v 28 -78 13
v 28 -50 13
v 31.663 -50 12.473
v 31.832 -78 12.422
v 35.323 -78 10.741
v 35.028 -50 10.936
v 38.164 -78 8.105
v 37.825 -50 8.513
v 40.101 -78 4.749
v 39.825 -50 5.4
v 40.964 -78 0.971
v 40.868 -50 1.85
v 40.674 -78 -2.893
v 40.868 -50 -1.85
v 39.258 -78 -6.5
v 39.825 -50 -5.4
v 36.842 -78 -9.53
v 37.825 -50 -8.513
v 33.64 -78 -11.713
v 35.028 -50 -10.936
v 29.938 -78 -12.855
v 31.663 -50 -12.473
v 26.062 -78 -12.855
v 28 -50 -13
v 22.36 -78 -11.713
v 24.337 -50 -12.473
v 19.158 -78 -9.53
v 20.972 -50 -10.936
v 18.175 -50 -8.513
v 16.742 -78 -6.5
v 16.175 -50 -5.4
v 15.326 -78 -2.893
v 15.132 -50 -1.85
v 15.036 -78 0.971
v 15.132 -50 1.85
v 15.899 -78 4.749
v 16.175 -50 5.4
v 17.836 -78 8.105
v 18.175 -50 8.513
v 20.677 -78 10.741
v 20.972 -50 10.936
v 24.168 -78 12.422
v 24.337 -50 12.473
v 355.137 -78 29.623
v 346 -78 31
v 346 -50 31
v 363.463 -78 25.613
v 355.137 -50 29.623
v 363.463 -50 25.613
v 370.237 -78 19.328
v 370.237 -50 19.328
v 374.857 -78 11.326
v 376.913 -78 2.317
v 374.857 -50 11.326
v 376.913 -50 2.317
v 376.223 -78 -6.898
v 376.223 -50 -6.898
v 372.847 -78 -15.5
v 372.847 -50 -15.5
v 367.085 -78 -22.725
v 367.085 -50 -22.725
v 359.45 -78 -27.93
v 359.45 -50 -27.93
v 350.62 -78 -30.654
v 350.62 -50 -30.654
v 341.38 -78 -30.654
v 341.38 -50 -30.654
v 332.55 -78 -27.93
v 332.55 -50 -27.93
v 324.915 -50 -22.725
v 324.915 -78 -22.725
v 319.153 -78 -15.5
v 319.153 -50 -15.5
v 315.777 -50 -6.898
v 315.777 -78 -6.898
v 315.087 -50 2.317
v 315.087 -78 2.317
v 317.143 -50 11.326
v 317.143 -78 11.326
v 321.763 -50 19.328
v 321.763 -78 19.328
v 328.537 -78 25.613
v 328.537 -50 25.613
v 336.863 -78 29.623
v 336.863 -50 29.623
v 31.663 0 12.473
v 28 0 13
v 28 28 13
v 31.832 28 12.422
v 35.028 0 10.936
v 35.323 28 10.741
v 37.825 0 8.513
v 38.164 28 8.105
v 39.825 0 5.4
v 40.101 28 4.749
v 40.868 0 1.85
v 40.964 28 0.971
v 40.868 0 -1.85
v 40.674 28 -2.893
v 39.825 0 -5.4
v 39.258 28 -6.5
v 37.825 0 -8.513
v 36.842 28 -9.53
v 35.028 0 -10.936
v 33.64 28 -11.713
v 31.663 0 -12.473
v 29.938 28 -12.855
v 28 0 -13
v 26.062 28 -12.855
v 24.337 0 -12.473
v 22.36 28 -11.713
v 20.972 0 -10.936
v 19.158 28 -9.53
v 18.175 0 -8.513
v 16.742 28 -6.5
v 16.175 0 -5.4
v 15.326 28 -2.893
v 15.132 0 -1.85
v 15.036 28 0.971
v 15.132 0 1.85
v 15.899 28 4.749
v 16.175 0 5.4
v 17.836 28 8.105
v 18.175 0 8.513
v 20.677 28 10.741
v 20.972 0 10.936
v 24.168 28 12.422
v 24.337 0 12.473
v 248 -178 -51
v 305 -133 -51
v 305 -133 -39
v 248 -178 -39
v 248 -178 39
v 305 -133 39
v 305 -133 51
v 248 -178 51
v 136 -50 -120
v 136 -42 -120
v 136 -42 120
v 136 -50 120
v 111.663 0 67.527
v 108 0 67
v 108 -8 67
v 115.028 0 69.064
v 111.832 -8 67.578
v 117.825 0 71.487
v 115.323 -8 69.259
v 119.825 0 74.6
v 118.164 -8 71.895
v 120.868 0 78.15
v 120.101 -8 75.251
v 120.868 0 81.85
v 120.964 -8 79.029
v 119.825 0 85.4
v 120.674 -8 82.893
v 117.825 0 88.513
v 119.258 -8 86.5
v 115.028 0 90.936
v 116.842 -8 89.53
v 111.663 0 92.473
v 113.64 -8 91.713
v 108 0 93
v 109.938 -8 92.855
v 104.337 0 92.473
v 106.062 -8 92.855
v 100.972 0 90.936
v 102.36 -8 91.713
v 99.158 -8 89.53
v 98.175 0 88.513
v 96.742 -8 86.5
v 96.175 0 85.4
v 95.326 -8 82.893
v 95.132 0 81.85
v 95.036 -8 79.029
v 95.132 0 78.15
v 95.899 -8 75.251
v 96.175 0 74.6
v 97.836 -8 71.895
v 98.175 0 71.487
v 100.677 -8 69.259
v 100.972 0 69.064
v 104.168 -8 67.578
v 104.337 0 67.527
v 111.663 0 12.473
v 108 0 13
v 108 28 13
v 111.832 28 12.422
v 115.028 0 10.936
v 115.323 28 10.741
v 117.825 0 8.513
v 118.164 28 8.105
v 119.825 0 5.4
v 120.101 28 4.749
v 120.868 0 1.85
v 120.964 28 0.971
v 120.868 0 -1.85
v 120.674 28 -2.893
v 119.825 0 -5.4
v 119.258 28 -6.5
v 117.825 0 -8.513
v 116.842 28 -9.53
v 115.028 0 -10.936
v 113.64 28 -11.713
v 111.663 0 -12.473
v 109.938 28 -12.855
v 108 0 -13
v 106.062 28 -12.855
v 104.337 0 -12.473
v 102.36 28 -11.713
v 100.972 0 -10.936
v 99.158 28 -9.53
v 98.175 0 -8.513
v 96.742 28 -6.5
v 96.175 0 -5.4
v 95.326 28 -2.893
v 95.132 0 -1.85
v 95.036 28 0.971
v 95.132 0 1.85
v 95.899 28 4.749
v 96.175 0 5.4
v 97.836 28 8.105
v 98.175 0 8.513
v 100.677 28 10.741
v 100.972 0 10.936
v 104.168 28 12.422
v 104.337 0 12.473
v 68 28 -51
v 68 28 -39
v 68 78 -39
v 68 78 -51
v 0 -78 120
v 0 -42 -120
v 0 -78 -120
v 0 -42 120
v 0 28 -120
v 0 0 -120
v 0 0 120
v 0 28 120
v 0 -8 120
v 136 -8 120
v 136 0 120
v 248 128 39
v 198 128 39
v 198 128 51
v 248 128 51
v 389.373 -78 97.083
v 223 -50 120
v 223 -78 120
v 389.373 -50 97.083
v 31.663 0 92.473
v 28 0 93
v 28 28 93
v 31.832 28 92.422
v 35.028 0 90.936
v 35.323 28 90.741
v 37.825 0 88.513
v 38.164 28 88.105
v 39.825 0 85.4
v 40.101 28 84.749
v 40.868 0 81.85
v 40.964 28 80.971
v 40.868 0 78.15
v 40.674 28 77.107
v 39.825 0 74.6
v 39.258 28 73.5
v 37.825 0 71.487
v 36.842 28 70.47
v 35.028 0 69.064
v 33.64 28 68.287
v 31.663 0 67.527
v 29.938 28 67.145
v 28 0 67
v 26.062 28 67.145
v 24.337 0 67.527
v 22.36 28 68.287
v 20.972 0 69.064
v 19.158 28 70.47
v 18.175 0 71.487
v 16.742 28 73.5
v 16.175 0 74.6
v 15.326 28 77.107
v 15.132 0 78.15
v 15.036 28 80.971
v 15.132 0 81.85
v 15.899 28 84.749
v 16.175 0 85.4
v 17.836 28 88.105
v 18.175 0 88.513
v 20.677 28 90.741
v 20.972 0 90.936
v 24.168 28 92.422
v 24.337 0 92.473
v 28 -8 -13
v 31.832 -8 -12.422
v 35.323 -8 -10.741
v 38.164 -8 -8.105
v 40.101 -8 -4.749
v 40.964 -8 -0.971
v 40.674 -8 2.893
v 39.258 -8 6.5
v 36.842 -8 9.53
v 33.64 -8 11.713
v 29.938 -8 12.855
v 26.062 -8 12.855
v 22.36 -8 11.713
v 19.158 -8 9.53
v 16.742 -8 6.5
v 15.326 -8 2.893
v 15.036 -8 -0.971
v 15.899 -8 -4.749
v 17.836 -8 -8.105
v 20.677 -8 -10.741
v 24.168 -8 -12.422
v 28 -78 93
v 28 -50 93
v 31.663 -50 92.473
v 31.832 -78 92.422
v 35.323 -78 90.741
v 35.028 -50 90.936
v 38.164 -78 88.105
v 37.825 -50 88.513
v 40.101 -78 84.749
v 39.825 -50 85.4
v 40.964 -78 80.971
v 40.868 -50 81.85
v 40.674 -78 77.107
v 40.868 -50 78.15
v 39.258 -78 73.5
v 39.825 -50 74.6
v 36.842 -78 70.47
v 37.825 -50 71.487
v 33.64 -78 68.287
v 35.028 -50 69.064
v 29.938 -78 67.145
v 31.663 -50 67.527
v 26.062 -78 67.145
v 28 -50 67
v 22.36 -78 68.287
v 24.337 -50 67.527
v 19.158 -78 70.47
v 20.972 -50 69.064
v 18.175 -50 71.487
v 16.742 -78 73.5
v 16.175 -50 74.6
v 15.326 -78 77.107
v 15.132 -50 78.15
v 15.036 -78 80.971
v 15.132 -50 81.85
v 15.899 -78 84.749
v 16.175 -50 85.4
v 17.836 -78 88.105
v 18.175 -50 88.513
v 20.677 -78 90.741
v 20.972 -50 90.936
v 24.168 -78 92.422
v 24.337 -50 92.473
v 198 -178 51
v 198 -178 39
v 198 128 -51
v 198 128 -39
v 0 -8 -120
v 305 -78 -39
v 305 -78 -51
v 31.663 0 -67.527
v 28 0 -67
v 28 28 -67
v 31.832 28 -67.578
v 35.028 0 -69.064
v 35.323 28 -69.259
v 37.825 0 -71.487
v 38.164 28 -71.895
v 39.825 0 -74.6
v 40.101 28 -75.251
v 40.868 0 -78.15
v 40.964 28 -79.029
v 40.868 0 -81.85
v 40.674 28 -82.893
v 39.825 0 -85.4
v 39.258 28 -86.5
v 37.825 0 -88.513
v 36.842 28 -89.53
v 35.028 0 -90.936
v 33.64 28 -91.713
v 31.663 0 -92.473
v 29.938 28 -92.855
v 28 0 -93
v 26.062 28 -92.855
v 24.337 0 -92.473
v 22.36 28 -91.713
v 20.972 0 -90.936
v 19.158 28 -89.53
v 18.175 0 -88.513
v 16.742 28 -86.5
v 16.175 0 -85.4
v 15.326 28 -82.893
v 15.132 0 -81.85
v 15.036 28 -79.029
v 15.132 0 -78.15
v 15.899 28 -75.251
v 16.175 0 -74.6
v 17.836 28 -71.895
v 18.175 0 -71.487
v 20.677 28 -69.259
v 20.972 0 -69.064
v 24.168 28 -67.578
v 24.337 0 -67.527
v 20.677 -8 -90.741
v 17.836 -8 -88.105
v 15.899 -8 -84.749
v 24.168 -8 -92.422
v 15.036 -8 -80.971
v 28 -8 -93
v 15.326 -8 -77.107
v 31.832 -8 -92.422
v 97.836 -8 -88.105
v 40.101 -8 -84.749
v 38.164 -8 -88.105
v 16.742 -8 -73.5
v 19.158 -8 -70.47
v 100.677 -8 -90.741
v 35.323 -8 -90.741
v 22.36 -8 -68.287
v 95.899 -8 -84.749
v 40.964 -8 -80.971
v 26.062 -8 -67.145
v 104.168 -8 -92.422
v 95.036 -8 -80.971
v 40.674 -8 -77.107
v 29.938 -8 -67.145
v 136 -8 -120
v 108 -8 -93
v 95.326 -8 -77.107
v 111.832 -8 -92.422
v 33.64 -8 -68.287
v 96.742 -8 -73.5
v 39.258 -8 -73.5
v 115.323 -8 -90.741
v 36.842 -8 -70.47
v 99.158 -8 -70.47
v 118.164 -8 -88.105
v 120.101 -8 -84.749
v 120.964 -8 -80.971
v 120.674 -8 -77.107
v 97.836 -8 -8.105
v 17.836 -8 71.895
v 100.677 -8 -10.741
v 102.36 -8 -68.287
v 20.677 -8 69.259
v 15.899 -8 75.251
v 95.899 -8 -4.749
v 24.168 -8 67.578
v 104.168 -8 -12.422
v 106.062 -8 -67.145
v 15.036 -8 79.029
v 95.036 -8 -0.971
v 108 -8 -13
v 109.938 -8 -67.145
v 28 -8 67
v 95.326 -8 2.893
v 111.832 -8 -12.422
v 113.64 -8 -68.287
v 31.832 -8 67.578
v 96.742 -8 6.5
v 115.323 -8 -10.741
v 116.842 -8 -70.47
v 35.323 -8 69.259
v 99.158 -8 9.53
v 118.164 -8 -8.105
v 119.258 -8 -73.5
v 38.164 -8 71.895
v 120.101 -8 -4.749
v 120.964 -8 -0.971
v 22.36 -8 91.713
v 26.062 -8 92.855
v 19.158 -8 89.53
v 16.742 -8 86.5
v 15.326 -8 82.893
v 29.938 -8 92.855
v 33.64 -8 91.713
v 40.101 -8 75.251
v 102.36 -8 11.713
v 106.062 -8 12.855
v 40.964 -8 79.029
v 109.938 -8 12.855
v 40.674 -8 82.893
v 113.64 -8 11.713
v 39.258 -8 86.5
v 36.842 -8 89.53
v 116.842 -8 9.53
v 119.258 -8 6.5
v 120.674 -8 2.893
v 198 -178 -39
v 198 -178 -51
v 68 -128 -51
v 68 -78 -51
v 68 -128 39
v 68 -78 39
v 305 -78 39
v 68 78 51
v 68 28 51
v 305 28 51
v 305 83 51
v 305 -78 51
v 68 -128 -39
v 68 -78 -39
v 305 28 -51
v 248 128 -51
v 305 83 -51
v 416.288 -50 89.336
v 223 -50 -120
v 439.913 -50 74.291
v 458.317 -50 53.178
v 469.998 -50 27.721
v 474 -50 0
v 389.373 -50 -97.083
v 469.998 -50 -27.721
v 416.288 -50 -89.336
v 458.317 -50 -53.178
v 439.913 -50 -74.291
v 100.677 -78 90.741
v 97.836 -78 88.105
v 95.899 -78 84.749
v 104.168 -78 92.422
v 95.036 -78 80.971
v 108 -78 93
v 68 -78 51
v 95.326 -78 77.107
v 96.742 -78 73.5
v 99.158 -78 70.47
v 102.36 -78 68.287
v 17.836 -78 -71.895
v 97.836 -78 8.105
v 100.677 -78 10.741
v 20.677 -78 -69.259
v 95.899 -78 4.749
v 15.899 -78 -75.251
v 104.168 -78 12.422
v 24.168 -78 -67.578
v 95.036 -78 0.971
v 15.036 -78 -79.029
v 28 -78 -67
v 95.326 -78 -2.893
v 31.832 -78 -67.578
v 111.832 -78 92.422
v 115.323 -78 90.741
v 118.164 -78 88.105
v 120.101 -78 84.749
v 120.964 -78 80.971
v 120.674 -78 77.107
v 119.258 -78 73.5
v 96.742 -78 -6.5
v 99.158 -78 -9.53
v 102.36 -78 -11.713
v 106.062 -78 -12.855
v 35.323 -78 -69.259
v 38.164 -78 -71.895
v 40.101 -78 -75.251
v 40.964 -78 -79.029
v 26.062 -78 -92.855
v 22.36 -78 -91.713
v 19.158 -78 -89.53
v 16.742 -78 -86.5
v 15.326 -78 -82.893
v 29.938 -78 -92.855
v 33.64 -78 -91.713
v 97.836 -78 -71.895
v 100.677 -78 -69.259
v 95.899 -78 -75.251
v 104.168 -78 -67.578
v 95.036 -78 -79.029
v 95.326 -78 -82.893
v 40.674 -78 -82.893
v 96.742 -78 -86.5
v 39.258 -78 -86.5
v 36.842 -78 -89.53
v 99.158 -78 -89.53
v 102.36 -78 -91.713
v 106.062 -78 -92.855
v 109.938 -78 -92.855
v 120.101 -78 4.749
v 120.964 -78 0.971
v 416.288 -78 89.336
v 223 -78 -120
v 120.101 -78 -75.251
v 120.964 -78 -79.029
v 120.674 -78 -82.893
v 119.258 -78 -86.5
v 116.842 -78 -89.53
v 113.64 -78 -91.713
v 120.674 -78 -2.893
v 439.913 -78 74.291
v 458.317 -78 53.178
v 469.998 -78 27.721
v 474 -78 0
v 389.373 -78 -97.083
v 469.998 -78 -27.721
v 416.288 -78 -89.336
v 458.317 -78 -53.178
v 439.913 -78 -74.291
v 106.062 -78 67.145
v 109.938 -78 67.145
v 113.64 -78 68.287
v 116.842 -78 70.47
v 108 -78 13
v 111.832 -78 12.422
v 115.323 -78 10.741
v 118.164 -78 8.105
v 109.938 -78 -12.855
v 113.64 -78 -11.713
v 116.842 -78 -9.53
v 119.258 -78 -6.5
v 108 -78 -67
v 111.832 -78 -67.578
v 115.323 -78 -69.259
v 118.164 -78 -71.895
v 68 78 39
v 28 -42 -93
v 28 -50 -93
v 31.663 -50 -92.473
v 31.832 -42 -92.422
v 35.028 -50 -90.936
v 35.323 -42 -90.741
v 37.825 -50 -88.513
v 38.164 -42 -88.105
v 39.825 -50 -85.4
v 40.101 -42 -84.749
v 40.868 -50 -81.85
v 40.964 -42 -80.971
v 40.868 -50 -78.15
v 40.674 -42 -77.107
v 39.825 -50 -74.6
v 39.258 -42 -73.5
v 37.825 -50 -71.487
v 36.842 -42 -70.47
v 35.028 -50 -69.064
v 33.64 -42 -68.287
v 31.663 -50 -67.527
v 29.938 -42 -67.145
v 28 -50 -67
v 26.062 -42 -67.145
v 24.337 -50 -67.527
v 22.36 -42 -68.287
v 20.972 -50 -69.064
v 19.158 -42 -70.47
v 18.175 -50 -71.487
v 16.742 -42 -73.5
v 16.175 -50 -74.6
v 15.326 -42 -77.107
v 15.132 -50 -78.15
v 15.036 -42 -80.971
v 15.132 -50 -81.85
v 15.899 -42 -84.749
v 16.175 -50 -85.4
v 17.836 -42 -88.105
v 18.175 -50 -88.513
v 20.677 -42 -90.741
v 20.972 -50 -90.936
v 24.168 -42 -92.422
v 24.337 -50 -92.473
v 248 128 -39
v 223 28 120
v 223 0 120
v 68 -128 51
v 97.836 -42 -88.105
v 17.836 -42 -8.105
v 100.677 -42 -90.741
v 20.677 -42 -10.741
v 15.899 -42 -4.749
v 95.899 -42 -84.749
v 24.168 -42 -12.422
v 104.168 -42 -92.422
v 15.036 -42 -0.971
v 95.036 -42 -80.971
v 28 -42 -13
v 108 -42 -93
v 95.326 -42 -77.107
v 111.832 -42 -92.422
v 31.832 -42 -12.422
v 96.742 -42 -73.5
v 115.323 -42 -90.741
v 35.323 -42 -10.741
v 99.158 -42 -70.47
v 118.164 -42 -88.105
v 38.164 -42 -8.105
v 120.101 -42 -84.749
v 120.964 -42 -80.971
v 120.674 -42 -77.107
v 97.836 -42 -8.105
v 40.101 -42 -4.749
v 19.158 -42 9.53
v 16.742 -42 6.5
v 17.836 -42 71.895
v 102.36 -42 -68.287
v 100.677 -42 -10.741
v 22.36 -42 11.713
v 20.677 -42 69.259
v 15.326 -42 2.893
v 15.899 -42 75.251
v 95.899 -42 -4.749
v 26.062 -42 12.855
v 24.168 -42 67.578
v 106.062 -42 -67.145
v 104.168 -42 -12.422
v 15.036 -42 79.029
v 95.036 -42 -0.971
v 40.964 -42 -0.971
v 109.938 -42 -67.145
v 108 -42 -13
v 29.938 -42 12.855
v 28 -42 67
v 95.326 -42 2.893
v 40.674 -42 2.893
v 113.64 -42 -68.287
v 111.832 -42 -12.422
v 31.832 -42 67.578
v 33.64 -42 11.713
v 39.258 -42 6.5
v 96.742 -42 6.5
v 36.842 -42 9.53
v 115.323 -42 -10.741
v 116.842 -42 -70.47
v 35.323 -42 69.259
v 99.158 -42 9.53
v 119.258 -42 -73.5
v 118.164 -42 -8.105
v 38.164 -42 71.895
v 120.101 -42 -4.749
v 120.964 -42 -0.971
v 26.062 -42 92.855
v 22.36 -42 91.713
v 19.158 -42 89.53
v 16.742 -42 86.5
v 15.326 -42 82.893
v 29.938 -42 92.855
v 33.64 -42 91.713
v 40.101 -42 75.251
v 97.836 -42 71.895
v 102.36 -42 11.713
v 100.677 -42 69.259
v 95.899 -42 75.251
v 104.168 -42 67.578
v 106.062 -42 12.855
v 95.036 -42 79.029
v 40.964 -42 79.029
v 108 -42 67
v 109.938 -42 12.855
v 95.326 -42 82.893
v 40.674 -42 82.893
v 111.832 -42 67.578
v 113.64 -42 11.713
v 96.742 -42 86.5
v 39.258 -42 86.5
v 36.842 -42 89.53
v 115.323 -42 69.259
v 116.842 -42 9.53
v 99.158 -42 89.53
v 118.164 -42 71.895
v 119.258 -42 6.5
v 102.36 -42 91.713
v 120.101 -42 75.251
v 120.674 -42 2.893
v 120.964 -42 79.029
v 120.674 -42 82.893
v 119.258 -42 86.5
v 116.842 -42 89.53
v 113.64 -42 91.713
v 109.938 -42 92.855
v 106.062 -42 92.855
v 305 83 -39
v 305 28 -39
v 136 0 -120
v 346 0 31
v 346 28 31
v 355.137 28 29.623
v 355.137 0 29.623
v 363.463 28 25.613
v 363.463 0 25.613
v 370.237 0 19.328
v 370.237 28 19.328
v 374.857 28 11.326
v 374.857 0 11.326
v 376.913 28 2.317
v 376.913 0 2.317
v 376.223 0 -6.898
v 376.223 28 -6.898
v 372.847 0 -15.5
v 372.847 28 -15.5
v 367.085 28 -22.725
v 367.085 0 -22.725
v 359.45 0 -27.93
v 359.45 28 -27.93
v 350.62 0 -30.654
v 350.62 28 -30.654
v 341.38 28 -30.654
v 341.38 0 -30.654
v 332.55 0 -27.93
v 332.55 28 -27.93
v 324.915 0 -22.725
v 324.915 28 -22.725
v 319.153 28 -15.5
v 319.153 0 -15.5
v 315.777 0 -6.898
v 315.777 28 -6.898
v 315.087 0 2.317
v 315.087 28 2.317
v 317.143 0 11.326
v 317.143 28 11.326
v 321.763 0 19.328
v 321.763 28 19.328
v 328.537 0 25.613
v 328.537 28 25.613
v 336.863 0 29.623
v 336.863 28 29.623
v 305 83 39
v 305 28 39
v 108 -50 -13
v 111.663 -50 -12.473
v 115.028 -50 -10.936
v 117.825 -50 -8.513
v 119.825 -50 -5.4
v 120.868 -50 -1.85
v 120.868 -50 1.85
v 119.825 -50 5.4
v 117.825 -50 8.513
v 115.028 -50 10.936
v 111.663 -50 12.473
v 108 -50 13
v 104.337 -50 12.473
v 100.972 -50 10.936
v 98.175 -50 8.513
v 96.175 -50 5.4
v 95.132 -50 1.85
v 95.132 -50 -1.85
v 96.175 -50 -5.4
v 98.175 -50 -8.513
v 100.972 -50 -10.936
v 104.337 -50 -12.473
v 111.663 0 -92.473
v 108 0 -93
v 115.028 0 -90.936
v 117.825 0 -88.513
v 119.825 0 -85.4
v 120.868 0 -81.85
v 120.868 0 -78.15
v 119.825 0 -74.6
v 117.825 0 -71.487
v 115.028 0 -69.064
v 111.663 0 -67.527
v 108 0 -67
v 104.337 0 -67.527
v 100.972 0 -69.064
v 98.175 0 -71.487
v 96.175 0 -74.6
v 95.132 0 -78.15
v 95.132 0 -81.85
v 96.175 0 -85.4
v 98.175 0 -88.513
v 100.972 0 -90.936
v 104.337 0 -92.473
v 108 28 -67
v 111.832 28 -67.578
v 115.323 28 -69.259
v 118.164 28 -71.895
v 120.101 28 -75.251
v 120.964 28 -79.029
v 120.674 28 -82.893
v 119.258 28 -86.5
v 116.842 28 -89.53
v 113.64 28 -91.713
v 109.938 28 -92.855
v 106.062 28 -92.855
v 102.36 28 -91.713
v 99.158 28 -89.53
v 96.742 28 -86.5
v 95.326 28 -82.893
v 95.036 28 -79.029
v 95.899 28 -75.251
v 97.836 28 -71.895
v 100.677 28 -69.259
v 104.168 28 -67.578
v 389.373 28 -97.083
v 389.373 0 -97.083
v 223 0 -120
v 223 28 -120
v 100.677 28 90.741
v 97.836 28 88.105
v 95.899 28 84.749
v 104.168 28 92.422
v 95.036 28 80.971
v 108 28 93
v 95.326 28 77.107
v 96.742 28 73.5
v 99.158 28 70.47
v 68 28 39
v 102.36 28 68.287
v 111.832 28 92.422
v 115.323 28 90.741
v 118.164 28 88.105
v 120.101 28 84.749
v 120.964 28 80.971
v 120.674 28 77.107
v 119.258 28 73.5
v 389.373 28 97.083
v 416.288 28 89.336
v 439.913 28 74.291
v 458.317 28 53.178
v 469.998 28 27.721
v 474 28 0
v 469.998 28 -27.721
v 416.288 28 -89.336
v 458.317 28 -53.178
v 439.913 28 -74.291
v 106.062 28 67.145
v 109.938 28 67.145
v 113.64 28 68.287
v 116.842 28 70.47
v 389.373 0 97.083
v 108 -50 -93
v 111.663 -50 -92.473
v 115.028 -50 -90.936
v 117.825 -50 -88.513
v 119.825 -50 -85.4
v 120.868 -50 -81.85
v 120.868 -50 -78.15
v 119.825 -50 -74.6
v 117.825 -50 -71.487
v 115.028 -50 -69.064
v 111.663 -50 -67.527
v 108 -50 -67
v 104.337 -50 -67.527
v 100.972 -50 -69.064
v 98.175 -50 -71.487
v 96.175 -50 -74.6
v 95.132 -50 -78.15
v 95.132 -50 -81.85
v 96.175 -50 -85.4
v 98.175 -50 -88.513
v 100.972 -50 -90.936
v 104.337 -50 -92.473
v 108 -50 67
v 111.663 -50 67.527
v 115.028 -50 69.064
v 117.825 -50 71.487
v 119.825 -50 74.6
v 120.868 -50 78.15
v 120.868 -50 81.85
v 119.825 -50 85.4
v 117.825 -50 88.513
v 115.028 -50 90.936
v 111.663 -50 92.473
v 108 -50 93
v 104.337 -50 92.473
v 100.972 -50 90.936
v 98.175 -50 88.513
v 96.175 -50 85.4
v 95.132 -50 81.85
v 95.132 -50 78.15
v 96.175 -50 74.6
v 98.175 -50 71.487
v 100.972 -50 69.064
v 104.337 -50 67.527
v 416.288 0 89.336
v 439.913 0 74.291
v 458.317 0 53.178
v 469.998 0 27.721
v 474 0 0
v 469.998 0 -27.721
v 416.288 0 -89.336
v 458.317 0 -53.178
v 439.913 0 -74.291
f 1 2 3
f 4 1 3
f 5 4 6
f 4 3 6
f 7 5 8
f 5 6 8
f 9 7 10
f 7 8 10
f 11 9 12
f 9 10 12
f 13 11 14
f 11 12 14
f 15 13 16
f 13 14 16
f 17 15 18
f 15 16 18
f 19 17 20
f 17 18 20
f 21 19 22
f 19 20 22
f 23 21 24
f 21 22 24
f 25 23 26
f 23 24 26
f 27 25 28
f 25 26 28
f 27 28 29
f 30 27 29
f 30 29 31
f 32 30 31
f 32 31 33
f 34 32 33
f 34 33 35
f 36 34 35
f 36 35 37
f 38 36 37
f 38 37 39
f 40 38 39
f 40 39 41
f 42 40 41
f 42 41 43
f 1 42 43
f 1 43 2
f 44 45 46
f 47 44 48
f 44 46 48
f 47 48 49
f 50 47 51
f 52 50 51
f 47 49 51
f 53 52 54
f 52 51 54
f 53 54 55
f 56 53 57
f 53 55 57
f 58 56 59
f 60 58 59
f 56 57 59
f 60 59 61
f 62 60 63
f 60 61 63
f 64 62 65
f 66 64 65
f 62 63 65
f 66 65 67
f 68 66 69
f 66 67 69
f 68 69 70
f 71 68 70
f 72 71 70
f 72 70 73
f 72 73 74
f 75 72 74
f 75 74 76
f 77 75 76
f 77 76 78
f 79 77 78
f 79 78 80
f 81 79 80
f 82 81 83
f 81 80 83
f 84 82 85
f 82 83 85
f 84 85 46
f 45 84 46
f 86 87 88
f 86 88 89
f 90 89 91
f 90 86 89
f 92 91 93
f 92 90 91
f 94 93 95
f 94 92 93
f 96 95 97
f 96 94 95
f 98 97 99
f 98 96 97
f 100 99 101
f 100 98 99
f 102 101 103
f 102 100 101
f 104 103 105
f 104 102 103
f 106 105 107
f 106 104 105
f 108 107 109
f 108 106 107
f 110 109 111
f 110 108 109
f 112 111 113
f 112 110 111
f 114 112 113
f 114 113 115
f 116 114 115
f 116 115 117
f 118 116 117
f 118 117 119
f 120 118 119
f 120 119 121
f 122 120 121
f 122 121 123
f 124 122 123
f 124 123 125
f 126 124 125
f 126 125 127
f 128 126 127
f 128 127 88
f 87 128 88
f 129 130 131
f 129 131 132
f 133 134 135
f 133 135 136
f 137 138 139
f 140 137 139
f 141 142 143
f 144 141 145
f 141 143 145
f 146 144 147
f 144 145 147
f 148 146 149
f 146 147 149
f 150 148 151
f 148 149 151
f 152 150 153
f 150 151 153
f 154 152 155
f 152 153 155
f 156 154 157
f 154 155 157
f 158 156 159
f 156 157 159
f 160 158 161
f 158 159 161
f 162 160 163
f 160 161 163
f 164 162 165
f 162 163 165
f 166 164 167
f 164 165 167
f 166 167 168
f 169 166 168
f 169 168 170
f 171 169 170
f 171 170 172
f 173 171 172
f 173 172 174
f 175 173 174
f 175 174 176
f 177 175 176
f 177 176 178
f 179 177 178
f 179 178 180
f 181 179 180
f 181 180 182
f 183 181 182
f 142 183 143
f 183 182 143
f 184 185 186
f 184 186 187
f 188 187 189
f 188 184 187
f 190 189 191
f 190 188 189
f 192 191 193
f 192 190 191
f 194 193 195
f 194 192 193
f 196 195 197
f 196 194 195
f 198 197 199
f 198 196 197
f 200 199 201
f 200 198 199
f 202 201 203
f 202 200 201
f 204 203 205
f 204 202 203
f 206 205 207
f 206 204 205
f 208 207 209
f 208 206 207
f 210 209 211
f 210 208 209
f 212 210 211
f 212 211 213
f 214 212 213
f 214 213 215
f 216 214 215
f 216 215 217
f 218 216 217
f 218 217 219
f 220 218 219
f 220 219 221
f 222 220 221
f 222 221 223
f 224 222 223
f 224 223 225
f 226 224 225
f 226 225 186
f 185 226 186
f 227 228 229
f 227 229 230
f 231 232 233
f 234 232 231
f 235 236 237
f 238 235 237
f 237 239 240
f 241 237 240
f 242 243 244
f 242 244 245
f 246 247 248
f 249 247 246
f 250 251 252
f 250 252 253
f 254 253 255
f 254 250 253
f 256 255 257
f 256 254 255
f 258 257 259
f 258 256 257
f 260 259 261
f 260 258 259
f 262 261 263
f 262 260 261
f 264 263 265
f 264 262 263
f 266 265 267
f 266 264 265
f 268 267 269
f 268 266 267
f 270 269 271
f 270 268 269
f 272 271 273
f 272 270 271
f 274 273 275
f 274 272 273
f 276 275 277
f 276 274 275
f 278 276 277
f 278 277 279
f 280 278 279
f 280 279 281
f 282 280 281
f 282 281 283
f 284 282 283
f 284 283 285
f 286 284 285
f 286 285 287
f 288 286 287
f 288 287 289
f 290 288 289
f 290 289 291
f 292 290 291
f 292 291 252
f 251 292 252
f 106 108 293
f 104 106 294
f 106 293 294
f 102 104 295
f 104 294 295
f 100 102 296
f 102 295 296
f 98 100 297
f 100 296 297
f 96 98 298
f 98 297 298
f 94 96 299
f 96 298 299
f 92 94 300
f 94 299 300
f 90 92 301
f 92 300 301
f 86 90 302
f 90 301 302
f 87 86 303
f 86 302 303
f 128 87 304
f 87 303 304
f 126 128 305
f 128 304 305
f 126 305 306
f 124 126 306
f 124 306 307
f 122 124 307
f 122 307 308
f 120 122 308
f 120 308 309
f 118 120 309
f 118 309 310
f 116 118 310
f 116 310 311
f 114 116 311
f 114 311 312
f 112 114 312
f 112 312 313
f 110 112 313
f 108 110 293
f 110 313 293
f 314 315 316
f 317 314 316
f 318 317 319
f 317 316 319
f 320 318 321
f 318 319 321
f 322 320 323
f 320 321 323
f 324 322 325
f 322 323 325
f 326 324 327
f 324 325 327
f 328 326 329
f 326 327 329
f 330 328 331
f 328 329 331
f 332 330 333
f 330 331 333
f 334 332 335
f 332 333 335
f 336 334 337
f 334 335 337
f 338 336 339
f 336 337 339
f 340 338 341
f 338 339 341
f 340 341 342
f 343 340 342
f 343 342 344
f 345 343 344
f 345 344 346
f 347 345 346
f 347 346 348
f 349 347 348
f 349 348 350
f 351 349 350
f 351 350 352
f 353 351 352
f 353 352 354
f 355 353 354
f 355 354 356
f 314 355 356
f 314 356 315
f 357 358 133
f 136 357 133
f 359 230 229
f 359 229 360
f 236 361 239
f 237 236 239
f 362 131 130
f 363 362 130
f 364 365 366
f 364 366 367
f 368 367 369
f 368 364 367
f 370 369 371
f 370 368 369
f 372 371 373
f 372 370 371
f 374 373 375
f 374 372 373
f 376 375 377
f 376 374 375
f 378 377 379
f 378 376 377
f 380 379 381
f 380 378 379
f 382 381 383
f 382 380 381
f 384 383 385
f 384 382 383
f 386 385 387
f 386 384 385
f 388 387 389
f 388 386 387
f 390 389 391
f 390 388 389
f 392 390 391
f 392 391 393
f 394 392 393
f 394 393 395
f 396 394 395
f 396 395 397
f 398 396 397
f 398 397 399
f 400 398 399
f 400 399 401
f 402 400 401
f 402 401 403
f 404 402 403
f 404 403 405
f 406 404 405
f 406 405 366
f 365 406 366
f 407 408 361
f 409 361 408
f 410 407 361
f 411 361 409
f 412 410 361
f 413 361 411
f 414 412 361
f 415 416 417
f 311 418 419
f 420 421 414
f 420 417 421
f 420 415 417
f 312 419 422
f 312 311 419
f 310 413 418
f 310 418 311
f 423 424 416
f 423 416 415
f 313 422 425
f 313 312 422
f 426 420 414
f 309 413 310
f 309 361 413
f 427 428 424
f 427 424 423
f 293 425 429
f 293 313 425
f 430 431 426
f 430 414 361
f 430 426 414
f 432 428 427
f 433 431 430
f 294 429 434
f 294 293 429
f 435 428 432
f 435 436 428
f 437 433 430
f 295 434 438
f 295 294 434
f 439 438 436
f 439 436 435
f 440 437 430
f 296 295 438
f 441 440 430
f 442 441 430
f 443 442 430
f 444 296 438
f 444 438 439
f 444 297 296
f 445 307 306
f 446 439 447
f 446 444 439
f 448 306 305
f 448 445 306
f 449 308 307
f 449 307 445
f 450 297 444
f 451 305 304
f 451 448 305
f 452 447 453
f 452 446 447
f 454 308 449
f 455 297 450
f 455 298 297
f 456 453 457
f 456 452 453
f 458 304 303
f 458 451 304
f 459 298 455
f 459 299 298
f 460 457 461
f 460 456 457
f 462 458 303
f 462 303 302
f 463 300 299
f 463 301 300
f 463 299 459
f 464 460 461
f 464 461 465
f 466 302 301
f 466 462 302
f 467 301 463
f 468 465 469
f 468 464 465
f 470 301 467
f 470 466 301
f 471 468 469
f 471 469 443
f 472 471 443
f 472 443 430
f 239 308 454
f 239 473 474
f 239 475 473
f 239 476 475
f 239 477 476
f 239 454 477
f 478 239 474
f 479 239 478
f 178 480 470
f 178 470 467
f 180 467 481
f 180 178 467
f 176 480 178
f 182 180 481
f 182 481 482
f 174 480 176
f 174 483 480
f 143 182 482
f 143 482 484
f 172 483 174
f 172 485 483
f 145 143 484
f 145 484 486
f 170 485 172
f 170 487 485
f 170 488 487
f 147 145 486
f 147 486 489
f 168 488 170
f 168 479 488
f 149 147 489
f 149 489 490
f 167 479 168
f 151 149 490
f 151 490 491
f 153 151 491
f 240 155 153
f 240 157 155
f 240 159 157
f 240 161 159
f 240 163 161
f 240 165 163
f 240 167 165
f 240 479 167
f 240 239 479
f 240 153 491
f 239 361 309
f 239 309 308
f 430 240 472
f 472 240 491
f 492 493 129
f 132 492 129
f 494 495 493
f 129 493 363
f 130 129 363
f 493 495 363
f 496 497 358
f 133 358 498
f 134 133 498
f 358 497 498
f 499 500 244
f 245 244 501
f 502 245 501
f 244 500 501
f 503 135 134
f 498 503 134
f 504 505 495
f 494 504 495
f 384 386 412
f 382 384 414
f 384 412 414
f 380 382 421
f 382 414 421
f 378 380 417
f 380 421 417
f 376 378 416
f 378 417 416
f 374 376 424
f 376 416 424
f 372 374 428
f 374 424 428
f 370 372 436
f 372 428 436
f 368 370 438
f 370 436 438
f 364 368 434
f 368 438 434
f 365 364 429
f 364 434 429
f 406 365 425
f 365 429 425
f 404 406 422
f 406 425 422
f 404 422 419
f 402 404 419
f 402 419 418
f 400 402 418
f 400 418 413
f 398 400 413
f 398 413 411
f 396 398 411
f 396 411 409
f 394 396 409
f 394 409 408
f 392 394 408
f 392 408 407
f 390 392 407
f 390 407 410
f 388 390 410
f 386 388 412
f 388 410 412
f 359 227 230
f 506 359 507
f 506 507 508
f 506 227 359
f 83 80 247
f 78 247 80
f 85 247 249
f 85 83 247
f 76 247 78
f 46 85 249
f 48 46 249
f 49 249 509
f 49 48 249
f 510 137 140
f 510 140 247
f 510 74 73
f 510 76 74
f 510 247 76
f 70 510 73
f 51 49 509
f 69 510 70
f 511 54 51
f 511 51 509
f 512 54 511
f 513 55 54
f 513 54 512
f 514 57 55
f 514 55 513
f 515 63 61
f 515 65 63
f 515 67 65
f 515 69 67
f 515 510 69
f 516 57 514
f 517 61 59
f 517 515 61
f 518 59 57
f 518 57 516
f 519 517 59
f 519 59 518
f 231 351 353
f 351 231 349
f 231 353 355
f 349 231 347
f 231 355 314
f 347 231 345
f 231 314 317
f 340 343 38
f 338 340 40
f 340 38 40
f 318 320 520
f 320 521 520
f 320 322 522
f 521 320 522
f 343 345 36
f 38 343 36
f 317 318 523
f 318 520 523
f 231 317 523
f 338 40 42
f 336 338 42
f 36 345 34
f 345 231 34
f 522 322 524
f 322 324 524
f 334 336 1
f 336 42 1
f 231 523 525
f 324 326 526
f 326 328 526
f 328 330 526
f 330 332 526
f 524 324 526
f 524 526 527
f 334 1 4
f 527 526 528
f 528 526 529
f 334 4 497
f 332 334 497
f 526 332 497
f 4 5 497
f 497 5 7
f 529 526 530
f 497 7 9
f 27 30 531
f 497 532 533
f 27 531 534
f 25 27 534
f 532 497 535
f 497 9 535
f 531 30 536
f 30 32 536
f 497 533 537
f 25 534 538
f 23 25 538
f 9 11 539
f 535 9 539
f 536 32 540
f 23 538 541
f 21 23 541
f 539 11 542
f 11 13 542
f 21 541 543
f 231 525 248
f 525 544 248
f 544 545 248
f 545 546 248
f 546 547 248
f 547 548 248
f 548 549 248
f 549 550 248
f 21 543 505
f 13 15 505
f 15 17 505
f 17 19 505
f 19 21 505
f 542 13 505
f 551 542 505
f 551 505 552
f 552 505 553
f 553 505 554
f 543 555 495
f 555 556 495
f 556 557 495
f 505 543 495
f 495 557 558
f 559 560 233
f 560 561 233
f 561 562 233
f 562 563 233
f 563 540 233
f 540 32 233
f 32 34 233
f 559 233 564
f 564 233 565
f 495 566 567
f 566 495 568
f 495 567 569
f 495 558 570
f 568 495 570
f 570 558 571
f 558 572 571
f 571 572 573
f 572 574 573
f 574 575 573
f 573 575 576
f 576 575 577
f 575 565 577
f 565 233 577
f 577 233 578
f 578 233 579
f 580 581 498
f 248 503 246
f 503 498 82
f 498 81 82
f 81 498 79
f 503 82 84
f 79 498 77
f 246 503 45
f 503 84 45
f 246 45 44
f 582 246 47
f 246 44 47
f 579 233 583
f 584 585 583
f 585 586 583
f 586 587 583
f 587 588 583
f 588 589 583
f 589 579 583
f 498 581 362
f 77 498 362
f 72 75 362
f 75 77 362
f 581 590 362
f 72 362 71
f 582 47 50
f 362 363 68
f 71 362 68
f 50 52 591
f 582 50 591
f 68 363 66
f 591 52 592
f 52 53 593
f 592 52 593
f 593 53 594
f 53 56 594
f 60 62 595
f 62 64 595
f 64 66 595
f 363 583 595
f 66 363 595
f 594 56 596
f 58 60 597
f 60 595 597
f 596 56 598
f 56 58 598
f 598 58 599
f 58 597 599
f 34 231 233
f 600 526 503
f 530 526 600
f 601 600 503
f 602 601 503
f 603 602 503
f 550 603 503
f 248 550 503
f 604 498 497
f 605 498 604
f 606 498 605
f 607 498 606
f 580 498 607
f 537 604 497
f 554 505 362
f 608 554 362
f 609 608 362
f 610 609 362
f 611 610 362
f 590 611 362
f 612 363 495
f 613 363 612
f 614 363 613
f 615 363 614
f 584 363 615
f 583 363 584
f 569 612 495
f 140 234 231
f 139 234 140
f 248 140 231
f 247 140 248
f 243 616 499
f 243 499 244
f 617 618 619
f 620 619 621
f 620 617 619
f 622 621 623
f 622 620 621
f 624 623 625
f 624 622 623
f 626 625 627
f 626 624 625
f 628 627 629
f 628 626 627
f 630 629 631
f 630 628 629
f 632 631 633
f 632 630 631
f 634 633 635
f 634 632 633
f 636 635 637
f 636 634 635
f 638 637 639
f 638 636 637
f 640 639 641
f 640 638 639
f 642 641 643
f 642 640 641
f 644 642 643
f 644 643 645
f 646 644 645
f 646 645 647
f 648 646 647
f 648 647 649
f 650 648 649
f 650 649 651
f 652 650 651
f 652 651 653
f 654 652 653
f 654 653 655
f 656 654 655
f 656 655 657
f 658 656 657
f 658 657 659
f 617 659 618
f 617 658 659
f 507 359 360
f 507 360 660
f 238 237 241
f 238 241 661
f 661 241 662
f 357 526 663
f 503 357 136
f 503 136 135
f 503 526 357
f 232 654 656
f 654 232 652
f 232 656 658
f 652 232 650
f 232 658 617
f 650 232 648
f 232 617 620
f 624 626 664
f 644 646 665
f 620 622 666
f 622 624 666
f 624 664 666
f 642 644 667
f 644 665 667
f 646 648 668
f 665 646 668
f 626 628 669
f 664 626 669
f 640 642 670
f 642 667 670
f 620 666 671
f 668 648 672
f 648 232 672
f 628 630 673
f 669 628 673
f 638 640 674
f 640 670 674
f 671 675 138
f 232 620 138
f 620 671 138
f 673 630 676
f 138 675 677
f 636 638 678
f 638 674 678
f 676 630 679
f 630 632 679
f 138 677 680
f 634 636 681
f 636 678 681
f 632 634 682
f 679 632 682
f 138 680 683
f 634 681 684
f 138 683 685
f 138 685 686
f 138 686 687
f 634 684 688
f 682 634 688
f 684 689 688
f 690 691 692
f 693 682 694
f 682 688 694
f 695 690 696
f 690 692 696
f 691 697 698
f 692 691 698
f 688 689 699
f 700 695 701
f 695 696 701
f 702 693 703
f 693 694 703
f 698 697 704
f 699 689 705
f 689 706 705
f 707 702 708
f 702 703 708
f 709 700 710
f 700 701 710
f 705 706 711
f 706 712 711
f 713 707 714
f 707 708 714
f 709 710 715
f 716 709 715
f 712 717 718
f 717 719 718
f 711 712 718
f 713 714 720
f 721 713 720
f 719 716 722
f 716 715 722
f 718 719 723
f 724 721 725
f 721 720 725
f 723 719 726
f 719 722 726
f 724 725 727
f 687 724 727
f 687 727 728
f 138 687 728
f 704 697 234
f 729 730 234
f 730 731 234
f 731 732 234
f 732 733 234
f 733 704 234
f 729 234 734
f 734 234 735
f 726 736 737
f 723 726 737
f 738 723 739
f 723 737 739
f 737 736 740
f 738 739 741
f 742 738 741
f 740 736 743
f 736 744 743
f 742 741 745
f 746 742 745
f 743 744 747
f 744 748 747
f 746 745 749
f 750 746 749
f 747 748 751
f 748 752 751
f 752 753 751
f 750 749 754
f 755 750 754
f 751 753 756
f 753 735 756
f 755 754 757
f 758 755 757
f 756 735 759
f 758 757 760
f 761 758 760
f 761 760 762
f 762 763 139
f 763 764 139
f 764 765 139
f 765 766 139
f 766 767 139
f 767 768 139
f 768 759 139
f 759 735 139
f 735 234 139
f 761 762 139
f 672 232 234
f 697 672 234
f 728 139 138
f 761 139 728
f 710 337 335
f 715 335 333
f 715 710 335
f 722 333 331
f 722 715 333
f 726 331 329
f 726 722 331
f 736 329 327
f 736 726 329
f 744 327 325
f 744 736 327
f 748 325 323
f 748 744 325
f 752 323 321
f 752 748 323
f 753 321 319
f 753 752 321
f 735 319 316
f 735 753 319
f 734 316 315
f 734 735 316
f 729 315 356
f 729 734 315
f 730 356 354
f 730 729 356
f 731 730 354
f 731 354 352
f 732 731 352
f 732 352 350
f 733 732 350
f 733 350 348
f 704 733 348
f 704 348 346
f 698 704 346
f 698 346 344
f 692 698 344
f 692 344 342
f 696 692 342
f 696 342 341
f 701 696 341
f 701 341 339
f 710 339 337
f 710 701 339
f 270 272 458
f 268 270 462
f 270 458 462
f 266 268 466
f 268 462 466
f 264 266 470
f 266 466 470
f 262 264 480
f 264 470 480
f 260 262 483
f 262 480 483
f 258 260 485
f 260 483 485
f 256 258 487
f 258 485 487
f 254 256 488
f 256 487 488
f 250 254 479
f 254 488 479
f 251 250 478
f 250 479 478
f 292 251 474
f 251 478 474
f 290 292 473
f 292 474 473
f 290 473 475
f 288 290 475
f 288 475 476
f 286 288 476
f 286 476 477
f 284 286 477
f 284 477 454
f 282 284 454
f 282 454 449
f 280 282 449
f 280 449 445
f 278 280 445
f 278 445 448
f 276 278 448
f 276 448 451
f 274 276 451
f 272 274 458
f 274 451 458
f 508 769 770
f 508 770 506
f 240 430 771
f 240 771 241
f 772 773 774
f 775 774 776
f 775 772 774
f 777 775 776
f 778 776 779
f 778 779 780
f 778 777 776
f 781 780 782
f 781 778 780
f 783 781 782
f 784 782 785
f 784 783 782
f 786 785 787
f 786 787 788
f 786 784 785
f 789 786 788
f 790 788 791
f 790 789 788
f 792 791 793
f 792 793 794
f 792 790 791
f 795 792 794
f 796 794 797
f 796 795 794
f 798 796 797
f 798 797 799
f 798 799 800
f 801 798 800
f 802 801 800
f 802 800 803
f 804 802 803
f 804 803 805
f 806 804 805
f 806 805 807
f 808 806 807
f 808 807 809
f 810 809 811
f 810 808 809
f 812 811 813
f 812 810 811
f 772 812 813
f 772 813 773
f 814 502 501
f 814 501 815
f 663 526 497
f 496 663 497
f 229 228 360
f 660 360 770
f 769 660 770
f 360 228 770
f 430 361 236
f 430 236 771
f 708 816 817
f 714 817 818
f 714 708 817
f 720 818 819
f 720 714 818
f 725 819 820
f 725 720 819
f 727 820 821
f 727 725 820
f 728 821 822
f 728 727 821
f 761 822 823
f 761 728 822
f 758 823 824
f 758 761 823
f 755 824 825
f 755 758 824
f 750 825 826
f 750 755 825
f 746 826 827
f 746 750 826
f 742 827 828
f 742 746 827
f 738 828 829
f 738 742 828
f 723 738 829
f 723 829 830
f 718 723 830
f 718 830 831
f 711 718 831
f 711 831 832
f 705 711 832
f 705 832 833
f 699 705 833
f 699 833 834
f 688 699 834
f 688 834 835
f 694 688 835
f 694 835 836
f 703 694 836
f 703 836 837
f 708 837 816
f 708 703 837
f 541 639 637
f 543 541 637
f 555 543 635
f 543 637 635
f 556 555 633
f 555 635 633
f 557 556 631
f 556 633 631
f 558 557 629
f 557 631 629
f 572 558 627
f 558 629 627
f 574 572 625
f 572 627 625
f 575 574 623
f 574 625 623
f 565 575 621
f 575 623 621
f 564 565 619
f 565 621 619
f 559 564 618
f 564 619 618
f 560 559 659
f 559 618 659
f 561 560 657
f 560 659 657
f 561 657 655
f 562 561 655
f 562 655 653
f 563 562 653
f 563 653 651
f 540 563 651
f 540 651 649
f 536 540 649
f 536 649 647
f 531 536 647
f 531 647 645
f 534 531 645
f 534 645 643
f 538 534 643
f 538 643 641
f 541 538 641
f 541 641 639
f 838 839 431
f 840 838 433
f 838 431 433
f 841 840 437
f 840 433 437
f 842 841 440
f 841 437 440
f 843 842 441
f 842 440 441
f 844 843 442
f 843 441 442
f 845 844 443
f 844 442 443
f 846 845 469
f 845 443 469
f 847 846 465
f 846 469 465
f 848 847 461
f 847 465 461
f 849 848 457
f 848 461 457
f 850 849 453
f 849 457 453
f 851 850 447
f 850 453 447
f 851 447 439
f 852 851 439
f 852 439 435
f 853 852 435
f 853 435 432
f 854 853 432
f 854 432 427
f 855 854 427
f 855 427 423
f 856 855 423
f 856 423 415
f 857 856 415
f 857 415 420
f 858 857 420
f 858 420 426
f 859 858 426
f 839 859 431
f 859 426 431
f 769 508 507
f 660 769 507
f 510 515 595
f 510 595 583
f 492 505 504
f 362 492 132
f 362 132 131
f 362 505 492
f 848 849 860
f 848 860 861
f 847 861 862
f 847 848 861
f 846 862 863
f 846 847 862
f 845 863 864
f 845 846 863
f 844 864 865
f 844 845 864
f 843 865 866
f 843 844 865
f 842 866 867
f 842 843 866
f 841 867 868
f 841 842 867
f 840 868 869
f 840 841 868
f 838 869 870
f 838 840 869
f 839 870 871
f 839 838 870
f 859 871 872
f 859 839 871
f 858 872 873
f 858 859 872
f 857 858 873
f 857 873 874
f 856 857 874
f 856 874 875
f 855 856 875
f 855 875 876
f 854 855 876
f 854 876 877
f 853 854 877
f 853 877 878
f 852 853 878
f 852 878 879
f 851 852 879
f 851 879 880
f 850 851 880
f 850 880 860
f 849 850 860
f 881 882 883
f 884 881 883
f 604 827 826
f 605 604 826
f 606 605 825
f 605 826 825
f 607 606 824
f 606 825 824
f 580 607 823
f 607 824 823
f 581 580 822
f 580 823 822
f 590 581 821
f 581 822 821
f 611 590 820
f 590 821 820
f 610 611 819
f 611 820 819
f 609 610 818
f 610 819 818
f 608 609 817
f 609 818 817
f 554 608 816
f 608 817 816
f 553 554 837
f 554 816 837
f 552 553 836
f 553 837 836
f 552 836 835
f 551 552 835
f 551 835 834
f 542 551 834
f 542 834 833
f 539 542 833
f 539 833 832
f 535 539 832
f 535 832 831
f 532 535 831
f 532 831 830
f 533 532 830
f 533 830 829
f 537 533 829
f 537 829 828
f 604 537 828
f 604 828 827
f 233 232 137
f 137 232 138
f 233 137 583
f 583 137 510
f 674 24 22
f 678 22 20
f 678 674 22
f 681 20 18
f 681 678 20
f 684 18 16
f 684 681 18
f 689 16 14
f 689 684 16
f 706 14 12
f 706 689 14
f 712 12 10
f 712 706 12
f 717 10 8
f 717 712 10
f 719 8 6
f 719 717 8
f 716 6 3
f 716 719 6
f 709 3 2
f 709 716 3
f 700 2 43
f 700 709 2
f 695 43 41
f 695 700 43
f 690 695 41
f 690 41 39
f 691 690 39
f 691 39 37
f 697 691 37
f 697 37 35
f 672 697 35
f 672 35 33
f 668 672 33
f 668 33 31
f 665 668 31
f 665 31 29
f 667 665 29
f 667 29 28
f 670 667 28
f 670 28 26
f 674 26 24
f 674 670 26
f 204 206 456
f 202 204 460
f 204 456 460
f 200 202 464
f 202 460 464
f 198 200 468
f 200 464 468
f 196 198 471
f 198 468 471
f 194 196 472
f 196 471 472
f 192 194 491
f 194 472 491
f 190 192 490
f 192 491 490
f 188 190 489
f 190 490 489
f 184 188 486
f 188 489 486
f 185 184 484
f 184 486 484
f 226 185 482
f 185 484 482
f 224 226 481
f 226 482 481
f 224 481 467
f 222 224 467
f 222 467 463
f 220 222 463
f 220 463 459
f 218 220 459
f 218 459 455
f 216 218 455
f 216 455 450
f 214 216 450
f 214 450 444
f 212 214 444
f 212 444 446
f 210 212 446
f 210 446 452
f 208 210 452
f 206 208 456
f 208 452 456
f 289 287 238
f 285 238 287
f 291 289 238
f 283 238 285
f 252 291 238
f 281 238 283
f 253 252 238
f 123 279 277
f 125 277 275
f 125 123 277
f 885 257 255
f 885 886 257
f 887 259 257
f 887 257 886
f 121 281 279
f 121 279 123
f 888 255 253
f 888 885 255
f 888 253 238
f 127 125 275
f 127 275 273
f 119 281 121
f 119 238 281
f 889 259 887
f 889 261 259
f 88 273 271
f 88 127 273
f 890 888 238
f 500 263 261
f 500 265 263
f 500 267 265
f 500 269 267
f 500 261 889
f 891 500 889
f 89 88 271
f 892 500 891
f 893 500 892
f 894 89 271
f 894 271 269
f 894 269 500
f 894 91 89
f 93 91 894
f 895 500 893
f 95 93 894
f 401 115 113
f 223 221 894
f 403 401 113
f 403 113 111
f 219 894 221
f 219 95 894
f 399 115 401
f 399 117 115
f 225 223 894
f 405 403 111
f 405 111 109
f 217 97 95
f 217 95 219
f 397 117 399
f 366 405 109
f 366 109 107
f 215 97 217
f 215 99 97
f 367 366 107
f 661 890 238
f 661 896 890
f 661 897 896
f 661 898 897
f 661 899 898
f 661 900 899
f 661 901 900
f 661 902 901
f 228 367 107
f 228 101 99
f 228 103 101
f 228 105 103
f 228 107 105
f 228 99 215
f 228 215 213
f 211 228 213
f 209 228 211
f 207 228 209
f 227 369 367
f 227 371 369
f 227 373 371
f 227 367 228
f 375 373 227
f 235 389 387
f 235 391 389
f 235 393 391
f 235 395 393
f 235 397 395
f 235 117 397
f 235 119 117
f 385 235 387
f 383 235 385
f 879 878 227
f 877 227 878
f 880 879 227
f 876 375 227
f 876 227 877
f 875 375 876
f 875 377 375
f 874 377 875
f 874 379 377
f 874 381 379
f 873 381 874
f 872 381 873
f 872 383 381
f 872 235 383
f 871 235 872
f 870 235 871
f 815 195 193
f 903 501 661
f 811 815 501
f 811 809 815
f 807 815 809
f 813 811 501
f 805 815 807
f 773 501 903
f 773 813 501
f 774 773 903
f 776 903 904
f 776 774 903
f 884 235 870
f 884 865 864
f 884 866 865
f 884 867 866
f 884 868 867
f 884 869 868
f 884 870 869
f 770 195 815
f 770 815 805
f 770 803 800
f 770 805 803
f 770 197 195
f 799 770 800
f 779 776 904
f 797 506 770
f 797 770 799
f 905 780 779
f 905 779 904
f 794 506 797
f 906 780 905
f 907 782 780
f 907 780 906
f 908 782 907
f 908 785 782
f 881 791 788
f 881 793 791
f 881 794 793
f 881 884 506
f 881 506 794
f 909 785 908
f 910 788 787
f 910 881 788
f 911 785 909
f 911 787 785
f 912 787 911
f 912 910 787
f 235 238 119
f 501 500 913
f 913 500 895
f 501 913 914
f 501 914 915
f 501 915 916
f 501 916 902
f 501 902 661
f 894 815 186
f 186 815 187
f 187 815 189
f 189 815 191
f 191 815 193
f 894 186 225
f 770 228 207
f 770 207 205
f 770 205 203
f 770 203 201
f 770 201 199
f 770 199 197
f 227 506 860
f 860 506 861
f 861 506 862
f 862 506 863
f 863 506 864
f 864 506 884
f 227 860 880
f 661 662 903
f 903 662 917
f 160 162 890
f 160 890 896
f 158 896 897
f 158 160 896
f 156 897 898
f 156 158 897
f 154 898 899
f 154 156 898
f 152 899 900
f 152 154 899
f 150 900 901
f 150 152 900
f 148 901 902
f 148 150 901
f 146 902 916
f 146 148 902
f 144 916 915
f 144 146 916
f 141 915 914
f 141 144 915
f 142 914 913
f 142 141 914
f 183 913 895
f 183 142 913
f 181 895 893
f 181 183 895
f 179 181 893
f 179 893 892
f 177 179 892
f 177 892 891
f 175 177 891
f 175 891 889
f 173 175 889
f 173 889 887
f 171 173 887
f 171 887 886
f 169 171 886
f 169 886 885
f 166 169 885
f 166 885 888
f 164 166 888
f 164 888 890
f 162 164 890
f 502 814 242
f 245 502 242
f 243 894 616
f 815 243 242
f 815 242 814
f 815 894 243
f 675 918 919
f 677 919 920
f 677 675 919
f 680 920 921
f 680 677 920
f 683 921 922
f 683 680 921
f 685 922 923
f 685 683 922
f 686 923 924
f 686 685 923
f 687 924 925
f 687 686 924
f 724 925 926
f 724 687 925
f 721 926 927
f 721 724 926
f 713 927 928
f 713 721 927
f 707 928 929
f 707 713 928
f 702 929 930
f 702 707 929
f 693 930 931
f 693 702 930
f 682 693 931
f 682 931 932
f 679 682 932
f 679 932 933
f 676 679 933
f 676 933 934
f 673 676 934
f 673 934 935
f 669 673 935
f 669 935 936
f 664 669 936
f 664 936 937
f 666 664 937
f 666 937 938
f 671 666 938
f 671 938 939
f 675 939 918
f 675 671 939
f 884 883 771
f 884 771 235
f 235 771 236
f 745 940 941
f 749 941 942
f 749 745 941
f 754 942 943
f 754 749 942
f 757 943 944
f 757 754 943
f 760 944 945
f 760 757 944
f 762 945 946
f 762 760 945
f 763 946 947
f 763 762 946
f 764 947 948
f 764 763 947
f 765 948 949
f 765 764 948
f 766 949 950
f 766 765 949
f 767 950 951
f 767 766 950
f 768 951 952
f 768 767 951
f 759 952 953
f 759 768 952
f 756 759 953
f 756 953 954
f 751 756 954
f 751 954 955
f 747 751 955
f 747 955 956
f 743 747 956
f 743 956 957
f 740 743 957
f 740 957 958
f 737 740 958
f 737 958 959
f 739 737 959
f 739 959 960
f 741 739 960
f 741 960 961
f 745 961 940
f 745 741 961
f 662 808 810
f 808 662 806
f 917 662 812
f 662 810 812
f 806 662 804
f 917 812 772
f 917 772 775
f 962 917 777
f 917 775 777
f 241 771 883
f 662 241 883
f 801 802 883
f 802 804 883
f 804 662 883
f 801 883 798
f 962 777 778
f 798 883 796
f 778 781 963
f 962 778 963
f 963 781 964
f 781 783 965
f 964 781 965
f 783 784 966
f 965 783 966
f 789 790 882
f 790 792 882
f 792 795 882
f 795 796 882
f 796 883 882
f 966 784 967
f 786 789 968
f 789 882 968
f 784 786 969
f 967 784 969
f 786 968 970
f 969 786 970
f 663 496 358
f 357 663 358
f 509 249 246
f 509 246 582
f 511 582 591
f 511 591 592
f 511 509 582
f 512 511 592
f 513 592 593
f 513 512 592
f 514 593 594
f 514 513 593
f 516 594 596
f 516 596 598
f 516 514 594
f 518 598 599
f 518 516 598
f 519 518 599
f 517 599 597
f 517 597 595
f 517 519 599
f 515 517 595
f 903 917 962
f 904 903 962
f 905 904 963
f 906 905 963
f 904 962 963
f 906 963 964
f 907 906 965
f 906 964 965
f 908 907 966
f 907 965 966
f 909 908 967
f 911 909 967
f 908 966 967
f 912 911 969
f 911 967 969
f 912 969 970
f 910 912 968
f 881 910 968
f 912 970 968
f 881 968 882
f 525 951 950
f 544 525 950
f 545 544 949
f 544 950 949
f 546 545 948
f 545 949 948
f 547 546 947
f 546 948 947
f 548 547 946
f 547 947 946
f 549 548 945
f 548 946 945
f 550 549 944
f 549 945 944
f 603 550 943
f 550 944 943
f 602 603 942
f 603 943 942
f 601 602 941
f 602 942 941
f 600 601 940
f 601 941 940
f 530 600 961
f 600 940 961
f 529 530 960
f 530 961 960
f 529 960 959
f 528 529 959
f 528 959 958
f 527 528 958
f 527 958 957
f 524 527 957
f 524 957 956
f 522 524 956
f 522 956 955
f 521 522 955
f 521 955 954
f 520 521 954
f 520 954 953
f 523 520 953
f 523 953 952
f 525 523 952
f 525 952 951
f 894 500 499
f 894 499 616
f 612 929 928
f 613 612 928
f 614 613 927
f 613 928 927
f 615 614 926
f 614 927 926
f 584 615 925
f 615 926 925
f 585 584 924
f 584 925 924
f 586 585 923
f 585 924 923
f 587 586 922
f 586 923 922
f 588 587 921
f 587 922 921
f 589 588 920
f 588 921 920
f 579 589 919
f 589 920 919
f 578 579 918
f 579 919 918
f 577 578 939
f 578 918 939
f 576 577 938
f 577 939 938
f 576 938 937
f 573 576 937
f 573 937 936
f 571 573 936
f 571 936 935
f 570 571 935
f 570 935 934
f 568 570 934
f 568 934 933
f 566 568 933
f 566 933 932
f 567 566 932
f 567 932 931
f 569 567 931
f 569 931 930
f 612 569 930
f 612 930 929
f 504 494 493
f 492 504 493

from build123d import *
from build123d.topology import SkipClean

# Parameters (mm, degrees)
SKETCH_1_R          = 31
SKETCH_1_R_2        = 13
EXTRUDE_1_DEPTH     = 28
SKETCH_2_W          = 237
SKETCH_2_H          = 12
EXTRUDE_2_DEPTH     = 100
CUT_EXTRUDE_1_DEPTH = 520.904798978
EXTRUDE_START       = 8
SKETCH_4_W          = 136
SKETCH_4_H          = 240
SKETCH_4_R          = 13
EXTRUDE_3_DEPTH     = 8


with BuildPart() as part:
    # 草图1 → 凸台-拉伸1 (new body)
    with BuildSketch(Plane(origin=(0, 0, 0), x_dir=(1, 0, 0), z_dir=(0, 1, 0))):
        with BuildLine():
            Line((0, 120), (0, -120))
            Line((0, -120), (223, -120))
            Line((223, -120), (389.372553838, -97.083339476))
            ThreePointArc((389.372553838, -97.083339476), (474, 0), (389.372553838, 97.083339476))
            Line((389.372553838, 97.083339476), (223, 120))
            Line((223, 120), (0, 120))
        make_face()
        with Locations(Location((346, 0, 0), (0, 0, 270))):
            Circle(SKETCH_1_R, mode=Mode.SUBTRACT)
        with Locations(Location((28, 80, 0), (0, 0, 270))):
            Circle(SKETCH_1_R_2, mode=Mode.SUBTRACT)
        with Locations(Location((28, 0, 0), (0, 0, 270))):
            Circle(SKETCH_1_R_2, mode=Mode.SUBTRACT)
        with Locations(Location((28, -80, 0), (0, 0, 270))):
            Circle(SKETCH_1_R_2, mode=Mode.SUBTRACT)
        with Locations(Location((108, 80, 0), (0, 0, 270))):
            Circle(SKETCH_1_R_2, mode=Mode.SUBTRACT)
        with Locations(Location((108, 0, 0), (0, 0, 270))):
            Circle(SKETCH_1_R_2, mode=Mode.SUBTRACT)
        with Locations(Location((108, -80, 0), (0, 0, 270))):
            Circle(SKETCH_1_R_2, mode=Mode.SUBTRACT)
    extrude(amount=EXTRUDE_1_DEPTH)

    # 草图2 → 凸台-拉伸2 (add)
    with BuildSketch(Plane(origin=(0, 28, 0), x_dir=(1, 0, 0), z_dir=(0, 1, 0))):
        with Locations((186.5, 45)):
            Rectangle(SKETCH_2_W, SKETCH_2_H)
        with Locations((186.5, -45)):
            Rectangle(SKETCH_2_W, SKETCH_2_H)
    extrude(amount=EXTRUDE_2_DEPTH)

    # 草图3 → 切除-拉伸1 (cut, through all)
    with BuildSketch(Plane(origin=(0, 0, -51), x_dir=(1, 0, 0), z_dir=(0, 0, -1))):
        Polygon((305, -128), (305, -83), (248, -128), align=None)
        Polygon((68, -128), (68, -78), (198, -128), align=None)
    extrude(amount=-CUT_EXTRUDE_1_DEPTH, mode=Mode.SUBTRACT)

    # 草图4 → 凸台-拉伸3 (add)
    with SkipClean():  # the faces are left unmerged after this step: merging them gives an invalid solid
        with BuildSketch(Plane.XZ.offset(EXTRUDE_START)):
            with Locations((68, 0)):
                Rectangle(SKETCH_4_W, SKETCH_4_H)
            with Locations(Location((28, 80, 0), (0, 0, 270))):
                Circle(SKETCH_4_R, mode=Mode.SUBTRACT)
            with Locations(Location((108, 80, 0), (0, 0, 270))):
                Circle(SKETCH_4_R, mode=Mode.SUBTRACT)
            with Locations(Location((108, 0, 0), (0, 0, 270))):
                Circle(SKETCH_4_R, mode=Mode.SUBTRACT)
            with Locations(Location((28, 0, 0), (0, 0, 270))):
                Circle(SKETCH_4_R, mode=Mode.SUBTRACT)
            with Locations(Location((28, -80, 0), (0, 0, 270))):
                Circle(SKETCH_4_R, mode=Mode.SUBTRACT)
            with Locations(Location((108, -80, 0), (0, 0, 270))):
                Circle(SKETCH_4_R, mode=Mode.SUBTRACT)
        extrude(amount=-EXTRUDE_3_DEPTH)


with BuildPart() as body_2:
    # 镜向1: mirrored copy
    add(part.part.mirror(Plane.ZX.offset(-25)))


solid = Compound([part.part, body_2.part])
